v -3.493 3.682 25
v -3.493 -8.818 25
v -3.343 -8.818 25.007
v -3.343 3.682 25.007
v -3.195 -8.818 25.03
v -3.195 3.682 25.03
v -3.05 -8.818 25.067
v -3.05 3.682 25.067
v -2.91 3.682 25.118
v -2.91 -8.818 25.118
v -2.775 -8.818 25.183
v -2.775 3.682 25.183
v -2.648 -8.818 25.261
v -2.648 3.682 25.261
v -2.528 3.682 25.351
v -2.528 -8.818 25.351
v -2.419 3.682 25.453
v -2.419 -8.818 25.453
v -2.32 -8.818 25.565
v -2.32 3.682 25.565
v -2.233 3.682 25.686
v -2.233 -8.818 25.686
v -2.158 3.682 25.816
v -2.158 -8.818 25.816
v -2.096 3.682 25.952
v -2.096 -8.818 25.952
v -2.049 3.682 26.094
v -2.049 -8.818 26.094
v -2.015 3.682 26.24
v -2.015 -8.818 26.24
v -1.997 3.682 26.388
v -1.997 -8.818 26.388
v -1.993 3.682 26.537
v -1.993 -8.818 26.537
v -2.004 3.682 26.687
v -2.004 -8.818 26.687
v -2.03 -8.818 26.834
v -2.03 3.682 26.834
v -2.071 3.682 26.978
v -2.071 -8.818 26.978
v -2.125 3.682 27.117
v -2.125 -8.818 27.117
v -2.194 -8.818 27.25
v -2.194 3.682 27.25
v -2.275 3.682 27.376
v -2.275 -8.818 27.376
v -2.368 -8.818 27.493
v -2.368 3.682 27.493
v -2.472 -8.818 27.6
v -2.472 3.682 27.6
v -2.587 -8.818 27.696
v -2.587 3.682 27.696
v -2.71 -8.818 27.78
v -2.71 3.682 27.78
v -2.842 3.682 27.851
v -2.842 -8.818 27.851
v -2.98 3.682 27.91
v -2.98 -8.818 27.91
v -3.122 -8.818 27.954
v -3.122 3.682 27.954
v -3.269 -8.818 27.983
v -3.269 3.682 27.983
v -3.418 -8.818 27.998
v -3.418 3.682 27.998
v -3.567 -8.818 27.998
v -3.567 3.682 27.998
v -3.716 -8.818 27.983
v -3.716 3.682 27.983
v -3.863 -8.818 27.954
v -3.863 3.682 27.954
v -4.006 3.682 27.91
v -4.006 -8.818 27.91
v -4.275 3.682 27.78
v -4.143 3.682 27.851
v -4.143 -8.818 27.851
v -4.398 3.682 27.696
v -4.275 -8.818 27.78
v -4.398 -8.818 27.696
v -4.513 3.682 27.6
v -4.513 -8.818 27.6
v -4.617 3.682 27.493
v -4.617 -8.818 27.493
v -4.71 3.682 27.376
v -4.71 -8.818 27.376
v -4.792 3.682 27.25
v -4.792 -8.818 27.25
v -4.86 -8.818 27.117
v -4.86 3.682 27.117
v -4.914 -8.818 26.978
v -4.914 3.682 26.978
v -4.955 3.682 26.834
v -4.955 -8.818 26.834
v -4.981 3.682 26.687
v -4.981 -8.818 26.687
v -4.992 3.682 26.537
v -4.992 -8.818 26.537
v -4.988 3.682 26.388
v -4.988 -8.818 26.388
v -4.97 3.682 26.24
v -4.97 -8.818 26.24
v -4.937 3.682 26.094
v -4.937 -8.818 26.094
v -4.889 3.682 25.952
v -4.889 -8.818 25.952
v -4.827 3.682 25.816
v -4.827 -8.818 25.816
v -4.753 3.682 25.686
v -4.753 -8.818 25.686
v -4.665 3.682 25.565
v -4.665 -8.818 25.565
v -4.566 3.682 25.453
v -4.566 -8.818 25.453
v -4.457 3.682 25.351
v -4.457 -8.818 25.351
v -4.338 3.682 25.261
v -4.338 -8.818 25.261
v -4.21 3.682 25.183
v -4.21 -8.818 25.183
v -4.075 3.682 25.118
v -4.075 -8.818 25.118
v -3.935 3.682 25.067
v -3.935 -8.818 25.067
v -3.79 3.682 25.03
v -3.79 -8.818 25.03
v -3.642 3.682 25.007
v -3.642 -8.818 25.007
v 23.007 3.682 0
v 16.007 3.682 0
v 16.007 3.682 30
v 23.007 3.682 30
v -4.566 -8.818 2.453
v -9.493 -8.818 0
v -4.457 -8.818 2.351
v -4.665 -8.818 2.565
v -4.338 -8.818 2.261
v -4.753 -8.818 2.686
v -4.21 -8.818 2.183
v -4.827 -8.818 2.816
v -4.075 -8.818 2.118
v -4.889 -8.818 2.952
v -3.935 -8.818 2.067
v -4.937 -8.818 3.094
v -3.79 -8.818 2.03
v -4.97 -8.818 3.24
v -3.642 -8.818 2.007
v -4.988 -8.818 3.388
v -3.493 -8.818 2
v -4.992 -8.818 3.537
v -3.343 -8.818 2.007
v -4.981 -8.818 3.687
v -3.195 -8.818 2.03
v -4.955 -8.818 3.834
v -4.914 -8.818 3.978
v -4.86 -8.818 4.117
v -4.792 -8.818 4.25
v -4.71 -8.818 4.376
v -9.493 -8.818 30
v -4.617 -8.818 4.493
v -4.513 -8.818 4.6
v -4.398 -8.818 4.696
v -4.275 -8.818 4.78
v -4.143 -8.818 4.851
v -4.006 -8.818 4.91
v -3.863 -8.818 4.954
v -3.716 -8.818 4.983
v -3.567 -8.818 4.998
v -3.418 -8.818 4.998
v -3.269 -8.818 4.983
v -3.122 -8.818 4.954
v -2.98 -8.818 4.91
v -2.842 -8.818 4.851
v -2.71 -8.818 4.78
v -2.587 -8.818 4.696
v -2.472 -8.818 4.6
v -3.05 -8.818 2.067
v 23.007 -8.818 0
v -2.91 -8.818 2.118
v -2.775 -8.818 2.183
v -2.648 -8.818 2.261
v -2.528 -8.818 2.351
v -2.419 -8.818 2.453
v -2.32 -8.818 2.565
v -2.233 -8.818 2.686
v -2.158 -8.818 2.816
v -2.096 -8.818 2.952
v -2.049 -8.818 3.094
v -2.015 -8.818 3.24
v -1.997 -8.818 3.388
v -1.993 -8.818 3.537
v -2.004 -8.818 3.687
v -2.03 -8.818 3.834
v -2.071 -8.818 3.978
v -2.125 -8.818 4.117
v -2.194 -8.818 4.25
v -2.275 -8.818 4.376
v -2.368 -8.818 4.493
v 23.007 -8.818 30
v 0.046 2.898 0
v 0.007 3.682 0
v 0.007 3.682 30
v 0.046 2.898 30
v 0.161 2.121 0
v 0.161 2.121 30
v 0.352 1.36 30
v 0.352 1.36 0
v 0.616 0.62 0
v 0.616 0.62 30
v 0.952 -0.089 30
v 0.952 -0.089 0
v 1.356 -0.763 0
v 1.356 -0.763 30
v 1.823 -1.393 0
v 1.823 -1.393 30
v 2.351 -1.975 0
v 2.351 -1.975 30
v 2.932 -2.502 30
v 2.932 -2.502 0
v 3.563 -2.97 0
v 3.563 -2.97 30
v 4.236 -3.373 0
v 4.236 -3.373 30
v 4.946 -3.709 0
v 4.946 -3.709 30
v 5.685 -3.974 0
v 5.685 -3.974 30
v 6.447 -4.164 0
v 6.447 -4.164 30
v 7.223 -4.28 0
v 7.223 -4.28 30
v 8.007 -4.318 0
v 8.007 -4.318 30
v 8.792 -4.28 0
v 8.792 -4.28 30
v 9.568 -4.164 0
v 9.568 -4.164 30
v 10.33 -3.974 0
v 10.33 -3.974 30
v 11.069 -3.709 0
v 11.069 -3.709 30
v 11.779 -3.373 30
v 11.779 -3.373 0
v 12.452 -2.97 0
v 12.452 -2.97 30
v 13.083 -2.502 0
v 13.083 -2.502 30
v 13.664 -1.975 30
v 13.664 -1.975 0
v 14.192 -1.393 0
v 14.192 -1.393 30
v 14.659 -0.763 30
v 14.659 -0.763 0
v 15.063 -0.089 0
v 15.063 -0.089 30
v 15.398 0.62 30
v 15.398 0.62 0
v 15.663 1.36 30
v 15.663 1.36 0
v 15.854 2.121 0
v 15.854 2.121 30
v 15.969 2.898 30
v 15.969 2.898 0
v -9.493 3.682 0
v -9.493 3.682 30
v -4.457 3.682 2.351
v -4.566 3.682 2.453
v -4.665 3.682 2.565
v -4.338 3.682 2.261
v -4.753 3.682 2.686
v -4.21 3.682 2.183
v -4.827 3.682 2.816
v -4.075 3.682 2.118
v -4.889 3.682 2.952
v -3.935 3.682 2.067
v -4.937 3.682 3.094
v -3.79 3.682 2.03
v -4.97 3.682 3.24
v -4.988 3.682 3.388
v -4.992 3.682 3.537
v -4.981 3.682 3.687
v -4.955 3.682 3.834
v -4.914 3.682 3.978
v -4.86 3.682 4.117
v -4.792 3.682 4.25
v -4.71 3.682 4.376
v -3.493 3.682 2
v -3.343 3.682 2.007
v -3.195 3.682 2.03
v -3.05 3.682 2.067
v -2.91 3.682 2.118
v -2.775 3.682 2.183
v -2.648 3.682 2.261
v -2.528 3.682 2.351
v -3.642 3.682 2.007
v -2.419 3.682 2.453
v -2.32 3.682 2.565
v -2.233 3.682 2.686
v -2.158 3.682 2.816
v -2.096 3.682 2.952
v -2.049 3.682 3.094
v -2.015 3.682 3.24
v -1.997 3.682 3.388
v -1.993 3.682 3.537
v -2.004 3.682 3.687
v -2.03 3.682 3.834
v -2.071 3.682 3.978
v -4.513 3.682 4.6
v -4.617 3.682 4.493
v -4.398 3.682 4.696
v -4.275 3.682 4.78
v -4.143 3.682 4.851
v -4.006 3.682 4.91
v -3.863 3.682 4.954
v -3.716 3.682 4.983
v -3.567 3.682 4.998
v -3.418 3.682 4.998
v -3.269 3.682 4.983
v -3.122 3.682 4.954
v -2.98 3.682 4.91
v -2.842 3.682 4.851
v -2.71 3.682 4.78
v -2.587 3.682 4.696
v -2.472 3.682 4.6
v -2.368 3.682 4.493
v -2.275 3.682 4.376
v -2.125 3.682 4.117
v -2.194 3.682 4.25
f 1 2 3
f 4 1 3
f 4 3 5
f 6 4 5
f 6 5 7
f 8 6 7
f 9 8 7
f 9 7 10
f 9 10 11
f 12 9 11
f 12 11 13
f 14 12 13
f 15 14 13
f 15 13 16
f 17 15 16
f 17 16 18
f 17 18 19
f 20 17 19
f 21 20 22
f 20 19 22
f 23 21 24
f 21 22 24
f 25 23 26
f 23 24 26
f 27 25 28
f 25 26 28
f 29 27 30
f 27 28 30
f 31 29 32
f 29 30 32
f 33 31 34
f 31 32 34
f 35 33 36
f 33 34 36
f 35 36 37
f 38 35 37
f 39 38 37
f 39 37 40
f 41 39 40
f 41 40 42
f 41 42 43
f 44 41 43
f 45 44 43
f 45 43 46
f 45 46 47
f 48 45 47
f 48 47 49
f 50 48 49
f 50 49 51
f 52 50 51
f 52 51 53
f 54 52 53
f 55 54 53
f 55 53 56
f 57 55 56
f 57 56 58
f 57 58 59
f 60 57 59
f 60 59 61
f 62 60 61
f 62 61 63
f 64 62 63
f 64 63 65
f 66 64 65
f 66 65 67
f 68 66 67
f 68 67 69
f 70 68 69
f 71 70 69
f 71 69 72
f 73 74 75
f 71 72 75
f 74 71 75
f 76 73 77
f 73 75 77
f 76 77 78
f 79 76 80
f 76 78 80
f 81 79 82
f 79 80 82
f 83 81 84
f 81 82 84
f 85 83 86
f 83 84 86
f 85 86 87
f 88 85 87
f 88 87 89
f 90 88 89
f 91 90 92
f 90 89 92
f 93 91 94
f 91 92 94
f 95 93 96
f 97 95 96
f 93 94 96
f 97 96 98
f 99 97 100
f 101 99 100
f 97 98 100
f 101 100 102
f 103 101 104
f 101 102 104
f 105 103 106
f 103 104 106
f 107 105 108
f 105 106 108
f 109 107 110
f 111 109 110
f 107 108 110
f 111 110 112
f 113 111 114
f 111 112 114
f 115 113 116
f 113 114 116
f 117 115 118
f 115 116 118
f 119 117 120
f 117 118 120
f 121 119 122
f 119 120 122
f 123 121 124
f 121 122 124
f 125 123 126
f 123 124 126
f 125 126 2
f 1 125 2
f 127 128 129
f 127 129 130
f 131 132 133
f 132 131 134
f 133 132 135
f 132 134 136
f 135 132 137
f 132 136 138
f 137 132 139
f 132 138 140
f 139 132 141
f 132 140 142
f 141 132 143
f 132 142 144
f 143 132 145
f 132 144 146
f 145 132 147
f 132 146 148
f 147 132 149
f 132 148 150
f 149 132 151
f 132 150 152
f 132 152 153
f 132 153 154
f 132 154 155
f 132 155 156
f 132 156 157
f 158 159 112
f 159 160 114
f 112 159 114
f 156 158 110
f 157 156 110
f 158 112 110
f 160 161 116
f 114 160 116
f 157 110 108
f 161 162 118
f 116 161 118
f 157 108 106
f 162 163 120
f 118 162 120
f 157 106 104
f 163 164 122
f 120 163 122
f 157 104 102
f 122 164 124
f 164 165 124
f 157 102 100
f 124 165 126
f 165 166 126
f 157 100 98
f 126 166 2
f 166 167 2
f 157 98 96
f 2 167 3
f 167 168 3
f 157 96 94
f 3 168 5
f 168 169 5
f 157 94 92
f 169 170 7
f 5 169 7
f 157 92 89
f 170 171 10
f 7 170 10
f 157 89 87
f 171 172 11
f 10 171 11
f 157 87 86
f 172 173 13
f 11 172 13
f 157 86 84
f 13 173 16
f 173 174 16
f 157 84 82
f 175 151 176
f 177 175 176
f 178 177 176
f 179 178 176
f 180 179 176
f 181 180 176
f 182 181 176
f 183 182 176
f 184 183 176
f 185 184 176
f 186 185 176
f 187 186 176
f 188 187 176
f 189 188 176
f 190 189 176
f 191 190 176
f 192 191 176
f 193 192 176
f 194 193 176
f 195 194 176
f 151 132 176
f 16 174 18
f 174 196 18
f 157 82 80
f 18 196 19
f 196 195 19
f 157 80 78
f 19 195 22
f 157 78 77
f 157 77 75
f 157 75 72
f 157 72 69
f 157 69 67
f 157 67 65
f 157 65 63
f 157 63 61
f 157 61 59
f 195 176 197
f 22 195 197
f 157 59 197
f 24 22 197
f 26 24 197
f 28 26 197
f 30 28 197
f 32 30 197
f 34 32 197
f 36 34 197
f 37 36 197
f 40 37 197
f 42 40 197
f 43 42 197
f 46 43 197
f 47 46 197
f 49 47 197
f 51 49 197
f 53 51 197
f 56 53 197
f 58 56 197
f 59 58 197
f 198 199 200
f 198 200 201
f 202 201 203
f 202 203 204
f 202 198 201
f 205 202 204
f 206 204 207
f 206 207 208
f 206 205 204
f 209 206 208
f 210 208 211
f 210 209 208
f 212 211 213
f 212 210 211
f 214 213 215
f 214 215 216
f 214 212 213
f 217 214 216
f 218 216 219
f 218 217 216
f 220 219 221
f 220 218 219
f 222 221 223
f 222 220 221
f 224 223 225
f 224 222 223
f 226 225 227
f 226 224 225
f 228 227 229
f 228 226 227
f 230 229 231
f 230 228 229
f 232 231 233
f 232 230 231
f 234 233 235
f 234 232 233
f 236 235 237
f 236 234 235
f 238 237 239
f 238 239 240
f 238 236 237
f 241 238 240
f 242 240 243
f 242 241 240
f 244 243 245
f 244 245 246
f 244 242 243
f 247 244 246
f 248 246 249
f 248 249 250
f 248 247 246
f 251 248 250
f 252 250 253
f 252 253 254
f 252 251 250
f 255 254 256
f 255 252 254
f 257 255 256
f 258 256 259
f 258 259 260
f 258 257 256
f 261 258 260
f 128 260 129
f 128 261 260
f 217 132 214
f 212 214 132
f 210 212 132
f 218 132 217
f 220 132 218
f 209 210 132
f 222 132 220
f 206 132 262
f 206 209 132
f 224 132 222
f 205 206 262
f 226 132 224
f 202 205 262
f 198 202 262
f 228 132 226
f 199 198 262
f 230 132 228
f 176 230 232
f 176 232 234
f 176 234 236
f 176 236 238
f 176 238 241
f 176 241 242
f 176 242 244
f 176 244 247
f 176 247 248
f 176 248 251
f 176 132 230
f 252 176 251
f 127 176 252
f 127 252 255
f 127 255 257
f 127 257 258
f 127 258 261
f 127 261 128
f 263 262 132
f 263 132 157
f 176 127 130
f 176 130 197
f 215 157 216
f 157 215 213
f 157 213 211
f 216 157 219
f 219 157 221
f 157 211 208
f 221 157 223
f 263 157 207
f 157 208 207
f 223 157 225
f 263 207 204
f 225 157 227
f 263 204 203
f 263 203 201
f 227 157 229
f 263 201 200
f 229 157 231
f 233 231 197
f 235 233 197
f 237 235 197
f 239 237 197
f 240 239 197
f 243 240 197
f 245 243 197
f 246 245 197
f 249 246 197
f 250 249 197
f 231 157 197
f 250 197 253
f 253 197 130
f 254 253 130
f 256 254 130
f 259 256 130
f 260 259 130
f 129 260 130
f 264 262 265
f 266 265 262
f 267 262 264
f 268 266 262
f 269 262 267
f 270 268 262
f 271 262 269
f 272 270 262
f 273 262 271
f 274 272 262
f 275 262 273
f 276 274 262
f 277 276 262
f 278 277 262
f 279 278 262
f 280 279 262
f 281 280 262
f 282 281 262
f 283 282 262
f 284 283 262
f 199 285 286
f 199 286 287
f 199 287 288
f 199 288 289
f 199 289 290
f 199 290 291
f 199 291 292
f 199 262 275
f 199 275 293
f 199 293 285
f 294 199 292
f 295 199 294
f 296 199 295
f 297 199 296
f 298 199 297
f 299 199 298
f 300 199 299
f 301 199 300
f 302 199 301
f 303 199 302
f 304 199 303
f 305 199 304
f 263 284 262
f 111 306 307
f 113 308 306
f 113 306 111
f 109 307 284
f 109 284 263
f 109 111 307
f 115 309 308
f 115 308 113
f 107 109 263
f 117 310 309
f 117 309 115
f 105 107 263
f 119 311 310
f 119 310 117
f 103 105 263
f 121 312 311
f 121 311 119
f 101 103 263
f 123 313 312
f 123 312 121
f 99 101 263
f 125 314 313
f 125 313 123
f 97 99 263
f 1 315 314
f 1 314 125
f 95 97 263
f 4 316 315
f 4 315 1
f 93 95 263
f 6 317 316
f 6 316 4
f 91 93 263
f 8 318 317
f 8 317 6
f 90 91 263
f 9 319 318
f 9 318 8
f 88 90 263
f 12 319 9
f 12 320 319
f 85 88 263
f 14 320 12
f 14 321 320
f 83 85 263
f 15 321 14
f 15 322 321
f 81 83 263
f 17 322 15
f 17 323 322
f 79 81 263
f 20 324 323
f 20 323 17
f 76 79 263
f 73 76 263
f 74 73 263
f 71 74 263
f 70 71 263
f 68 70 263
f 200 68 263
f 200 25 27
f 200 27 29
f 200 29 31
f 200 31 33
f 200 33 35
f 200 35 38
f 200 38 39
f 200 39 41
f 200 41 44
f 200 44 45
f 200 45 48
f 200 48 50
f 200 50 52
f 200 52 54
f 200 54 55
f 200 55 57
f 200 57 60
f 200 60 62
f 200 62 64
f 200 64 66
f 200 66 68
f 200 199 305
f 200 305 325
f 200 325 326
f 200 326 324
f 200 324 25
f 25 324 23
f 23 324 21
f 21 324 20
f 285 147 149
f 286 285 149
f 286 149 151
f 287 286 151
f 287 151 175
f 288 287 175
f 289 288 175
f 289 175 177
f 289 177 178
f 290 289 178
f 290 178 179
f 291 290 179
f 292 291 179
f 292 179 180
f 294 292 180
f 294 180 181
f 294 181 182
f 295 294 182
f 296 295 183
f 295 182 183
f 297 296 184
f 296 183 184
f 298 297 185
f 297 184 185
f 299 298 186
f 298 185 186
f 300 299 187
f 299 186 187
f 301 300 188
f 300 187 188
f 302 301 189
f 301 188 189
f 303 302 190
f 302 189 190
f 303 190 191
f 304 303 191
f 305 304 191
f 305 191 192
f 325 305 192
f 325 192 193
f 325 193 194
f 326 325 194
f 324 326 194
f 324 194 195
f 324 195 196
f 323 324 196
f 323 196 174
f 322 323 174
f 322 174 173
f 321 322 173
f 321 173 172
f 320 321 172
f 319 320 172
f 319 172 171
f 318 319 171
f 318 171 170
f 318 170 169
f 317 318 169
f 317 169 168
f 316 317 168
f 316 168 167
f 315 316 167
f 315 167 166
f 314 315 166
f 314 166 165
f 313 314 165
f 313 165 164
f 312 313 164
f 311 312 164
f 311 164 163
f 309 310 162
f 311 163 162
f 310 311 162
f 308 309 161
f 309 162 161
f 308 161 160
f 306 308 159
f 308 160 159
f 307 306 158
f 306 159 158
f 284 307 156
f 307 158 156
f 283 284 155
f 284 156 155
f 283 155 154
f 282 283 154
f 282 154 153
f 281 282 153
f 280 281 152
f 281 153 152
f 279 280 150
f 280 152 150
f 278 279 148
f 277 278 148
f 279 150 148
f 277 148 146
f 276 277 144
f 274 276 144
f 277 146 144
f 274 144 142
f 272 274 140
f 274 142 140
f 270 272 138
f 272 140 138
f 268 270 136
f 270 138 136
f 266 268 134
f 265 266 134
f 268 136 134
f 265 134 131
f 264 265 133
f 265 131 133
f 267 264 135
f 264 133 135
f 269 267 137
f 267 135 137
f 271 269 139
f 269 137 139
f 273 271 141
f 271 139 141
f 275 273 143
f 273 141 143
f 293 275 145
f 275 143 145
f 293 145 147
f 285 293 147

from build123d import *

# Parameters (mm, degrees)
BOSS_EXTRUDE1_DEPTH = 30
SKETCH2_R           = 1.5
CUT_EXTRUDE1_DEPTH  = 40.819488185
SKETCH3_W           = 30
SKETCH3_H           = 12.5
BOSS_EXTRUDE2_DEPTH = 2.5


with BuildPart() as part:
    # Sketch1 → Boss-Extrude1 (new body)
    with BuildSketch(Plane.XY):
        with BuildLine():
            Line((16.007425743, 3.681930693), (23.007425743, 3.681930693))
            Line((23.007425743, 3.681930693), (23.007425743, -8.818069307))
            Line((23.007425743, -8.818069307), (-6.992574257, -8.818069307))
            Line((-6.992574257, -8.818069307), (-6.992574257, 3.681930693))
            Line((-6.992574257, 3.681930693), (0.007425743, 3.681930693))
            ThreePointArc((0.007425743, 3.681930693), (8.007425743, -4.318069307), (16.007425743, 3.681930693))
        make_face()
    extrude(amount=BOSS_EXTRUDE1_DEPTH)

    # Sketch2 → Cut-Extrude1 (cut, through all)
    with BuildSketch(Plane.XZ.offset(8.818069307)):
        with Locations(Location((-3.492574257, 3.5, 0), (0, 0, 270))):
            Circle(SKETCH2_R)
        with Locations(Location((-3.492574257, 26.5, 0), (0, 0, 270))):
            Circle(SKETCH2_R)
    extrude(amount=-CUT_EXTRUDE1_DEPTH, mode=Mode.SUBTRACT)

    # Sketch3 → Boss-Extrude2 (add)
    with BuildSketch(Plane.ZY.offset(6.992574257)):
        with Locations((15, -2.568069307)):
            Rectangle(SKETCH3_W, SKETCH3_H)
    extrude(amount=BOSS_EXTRUDE2_DEPTH)


solid = part.part
